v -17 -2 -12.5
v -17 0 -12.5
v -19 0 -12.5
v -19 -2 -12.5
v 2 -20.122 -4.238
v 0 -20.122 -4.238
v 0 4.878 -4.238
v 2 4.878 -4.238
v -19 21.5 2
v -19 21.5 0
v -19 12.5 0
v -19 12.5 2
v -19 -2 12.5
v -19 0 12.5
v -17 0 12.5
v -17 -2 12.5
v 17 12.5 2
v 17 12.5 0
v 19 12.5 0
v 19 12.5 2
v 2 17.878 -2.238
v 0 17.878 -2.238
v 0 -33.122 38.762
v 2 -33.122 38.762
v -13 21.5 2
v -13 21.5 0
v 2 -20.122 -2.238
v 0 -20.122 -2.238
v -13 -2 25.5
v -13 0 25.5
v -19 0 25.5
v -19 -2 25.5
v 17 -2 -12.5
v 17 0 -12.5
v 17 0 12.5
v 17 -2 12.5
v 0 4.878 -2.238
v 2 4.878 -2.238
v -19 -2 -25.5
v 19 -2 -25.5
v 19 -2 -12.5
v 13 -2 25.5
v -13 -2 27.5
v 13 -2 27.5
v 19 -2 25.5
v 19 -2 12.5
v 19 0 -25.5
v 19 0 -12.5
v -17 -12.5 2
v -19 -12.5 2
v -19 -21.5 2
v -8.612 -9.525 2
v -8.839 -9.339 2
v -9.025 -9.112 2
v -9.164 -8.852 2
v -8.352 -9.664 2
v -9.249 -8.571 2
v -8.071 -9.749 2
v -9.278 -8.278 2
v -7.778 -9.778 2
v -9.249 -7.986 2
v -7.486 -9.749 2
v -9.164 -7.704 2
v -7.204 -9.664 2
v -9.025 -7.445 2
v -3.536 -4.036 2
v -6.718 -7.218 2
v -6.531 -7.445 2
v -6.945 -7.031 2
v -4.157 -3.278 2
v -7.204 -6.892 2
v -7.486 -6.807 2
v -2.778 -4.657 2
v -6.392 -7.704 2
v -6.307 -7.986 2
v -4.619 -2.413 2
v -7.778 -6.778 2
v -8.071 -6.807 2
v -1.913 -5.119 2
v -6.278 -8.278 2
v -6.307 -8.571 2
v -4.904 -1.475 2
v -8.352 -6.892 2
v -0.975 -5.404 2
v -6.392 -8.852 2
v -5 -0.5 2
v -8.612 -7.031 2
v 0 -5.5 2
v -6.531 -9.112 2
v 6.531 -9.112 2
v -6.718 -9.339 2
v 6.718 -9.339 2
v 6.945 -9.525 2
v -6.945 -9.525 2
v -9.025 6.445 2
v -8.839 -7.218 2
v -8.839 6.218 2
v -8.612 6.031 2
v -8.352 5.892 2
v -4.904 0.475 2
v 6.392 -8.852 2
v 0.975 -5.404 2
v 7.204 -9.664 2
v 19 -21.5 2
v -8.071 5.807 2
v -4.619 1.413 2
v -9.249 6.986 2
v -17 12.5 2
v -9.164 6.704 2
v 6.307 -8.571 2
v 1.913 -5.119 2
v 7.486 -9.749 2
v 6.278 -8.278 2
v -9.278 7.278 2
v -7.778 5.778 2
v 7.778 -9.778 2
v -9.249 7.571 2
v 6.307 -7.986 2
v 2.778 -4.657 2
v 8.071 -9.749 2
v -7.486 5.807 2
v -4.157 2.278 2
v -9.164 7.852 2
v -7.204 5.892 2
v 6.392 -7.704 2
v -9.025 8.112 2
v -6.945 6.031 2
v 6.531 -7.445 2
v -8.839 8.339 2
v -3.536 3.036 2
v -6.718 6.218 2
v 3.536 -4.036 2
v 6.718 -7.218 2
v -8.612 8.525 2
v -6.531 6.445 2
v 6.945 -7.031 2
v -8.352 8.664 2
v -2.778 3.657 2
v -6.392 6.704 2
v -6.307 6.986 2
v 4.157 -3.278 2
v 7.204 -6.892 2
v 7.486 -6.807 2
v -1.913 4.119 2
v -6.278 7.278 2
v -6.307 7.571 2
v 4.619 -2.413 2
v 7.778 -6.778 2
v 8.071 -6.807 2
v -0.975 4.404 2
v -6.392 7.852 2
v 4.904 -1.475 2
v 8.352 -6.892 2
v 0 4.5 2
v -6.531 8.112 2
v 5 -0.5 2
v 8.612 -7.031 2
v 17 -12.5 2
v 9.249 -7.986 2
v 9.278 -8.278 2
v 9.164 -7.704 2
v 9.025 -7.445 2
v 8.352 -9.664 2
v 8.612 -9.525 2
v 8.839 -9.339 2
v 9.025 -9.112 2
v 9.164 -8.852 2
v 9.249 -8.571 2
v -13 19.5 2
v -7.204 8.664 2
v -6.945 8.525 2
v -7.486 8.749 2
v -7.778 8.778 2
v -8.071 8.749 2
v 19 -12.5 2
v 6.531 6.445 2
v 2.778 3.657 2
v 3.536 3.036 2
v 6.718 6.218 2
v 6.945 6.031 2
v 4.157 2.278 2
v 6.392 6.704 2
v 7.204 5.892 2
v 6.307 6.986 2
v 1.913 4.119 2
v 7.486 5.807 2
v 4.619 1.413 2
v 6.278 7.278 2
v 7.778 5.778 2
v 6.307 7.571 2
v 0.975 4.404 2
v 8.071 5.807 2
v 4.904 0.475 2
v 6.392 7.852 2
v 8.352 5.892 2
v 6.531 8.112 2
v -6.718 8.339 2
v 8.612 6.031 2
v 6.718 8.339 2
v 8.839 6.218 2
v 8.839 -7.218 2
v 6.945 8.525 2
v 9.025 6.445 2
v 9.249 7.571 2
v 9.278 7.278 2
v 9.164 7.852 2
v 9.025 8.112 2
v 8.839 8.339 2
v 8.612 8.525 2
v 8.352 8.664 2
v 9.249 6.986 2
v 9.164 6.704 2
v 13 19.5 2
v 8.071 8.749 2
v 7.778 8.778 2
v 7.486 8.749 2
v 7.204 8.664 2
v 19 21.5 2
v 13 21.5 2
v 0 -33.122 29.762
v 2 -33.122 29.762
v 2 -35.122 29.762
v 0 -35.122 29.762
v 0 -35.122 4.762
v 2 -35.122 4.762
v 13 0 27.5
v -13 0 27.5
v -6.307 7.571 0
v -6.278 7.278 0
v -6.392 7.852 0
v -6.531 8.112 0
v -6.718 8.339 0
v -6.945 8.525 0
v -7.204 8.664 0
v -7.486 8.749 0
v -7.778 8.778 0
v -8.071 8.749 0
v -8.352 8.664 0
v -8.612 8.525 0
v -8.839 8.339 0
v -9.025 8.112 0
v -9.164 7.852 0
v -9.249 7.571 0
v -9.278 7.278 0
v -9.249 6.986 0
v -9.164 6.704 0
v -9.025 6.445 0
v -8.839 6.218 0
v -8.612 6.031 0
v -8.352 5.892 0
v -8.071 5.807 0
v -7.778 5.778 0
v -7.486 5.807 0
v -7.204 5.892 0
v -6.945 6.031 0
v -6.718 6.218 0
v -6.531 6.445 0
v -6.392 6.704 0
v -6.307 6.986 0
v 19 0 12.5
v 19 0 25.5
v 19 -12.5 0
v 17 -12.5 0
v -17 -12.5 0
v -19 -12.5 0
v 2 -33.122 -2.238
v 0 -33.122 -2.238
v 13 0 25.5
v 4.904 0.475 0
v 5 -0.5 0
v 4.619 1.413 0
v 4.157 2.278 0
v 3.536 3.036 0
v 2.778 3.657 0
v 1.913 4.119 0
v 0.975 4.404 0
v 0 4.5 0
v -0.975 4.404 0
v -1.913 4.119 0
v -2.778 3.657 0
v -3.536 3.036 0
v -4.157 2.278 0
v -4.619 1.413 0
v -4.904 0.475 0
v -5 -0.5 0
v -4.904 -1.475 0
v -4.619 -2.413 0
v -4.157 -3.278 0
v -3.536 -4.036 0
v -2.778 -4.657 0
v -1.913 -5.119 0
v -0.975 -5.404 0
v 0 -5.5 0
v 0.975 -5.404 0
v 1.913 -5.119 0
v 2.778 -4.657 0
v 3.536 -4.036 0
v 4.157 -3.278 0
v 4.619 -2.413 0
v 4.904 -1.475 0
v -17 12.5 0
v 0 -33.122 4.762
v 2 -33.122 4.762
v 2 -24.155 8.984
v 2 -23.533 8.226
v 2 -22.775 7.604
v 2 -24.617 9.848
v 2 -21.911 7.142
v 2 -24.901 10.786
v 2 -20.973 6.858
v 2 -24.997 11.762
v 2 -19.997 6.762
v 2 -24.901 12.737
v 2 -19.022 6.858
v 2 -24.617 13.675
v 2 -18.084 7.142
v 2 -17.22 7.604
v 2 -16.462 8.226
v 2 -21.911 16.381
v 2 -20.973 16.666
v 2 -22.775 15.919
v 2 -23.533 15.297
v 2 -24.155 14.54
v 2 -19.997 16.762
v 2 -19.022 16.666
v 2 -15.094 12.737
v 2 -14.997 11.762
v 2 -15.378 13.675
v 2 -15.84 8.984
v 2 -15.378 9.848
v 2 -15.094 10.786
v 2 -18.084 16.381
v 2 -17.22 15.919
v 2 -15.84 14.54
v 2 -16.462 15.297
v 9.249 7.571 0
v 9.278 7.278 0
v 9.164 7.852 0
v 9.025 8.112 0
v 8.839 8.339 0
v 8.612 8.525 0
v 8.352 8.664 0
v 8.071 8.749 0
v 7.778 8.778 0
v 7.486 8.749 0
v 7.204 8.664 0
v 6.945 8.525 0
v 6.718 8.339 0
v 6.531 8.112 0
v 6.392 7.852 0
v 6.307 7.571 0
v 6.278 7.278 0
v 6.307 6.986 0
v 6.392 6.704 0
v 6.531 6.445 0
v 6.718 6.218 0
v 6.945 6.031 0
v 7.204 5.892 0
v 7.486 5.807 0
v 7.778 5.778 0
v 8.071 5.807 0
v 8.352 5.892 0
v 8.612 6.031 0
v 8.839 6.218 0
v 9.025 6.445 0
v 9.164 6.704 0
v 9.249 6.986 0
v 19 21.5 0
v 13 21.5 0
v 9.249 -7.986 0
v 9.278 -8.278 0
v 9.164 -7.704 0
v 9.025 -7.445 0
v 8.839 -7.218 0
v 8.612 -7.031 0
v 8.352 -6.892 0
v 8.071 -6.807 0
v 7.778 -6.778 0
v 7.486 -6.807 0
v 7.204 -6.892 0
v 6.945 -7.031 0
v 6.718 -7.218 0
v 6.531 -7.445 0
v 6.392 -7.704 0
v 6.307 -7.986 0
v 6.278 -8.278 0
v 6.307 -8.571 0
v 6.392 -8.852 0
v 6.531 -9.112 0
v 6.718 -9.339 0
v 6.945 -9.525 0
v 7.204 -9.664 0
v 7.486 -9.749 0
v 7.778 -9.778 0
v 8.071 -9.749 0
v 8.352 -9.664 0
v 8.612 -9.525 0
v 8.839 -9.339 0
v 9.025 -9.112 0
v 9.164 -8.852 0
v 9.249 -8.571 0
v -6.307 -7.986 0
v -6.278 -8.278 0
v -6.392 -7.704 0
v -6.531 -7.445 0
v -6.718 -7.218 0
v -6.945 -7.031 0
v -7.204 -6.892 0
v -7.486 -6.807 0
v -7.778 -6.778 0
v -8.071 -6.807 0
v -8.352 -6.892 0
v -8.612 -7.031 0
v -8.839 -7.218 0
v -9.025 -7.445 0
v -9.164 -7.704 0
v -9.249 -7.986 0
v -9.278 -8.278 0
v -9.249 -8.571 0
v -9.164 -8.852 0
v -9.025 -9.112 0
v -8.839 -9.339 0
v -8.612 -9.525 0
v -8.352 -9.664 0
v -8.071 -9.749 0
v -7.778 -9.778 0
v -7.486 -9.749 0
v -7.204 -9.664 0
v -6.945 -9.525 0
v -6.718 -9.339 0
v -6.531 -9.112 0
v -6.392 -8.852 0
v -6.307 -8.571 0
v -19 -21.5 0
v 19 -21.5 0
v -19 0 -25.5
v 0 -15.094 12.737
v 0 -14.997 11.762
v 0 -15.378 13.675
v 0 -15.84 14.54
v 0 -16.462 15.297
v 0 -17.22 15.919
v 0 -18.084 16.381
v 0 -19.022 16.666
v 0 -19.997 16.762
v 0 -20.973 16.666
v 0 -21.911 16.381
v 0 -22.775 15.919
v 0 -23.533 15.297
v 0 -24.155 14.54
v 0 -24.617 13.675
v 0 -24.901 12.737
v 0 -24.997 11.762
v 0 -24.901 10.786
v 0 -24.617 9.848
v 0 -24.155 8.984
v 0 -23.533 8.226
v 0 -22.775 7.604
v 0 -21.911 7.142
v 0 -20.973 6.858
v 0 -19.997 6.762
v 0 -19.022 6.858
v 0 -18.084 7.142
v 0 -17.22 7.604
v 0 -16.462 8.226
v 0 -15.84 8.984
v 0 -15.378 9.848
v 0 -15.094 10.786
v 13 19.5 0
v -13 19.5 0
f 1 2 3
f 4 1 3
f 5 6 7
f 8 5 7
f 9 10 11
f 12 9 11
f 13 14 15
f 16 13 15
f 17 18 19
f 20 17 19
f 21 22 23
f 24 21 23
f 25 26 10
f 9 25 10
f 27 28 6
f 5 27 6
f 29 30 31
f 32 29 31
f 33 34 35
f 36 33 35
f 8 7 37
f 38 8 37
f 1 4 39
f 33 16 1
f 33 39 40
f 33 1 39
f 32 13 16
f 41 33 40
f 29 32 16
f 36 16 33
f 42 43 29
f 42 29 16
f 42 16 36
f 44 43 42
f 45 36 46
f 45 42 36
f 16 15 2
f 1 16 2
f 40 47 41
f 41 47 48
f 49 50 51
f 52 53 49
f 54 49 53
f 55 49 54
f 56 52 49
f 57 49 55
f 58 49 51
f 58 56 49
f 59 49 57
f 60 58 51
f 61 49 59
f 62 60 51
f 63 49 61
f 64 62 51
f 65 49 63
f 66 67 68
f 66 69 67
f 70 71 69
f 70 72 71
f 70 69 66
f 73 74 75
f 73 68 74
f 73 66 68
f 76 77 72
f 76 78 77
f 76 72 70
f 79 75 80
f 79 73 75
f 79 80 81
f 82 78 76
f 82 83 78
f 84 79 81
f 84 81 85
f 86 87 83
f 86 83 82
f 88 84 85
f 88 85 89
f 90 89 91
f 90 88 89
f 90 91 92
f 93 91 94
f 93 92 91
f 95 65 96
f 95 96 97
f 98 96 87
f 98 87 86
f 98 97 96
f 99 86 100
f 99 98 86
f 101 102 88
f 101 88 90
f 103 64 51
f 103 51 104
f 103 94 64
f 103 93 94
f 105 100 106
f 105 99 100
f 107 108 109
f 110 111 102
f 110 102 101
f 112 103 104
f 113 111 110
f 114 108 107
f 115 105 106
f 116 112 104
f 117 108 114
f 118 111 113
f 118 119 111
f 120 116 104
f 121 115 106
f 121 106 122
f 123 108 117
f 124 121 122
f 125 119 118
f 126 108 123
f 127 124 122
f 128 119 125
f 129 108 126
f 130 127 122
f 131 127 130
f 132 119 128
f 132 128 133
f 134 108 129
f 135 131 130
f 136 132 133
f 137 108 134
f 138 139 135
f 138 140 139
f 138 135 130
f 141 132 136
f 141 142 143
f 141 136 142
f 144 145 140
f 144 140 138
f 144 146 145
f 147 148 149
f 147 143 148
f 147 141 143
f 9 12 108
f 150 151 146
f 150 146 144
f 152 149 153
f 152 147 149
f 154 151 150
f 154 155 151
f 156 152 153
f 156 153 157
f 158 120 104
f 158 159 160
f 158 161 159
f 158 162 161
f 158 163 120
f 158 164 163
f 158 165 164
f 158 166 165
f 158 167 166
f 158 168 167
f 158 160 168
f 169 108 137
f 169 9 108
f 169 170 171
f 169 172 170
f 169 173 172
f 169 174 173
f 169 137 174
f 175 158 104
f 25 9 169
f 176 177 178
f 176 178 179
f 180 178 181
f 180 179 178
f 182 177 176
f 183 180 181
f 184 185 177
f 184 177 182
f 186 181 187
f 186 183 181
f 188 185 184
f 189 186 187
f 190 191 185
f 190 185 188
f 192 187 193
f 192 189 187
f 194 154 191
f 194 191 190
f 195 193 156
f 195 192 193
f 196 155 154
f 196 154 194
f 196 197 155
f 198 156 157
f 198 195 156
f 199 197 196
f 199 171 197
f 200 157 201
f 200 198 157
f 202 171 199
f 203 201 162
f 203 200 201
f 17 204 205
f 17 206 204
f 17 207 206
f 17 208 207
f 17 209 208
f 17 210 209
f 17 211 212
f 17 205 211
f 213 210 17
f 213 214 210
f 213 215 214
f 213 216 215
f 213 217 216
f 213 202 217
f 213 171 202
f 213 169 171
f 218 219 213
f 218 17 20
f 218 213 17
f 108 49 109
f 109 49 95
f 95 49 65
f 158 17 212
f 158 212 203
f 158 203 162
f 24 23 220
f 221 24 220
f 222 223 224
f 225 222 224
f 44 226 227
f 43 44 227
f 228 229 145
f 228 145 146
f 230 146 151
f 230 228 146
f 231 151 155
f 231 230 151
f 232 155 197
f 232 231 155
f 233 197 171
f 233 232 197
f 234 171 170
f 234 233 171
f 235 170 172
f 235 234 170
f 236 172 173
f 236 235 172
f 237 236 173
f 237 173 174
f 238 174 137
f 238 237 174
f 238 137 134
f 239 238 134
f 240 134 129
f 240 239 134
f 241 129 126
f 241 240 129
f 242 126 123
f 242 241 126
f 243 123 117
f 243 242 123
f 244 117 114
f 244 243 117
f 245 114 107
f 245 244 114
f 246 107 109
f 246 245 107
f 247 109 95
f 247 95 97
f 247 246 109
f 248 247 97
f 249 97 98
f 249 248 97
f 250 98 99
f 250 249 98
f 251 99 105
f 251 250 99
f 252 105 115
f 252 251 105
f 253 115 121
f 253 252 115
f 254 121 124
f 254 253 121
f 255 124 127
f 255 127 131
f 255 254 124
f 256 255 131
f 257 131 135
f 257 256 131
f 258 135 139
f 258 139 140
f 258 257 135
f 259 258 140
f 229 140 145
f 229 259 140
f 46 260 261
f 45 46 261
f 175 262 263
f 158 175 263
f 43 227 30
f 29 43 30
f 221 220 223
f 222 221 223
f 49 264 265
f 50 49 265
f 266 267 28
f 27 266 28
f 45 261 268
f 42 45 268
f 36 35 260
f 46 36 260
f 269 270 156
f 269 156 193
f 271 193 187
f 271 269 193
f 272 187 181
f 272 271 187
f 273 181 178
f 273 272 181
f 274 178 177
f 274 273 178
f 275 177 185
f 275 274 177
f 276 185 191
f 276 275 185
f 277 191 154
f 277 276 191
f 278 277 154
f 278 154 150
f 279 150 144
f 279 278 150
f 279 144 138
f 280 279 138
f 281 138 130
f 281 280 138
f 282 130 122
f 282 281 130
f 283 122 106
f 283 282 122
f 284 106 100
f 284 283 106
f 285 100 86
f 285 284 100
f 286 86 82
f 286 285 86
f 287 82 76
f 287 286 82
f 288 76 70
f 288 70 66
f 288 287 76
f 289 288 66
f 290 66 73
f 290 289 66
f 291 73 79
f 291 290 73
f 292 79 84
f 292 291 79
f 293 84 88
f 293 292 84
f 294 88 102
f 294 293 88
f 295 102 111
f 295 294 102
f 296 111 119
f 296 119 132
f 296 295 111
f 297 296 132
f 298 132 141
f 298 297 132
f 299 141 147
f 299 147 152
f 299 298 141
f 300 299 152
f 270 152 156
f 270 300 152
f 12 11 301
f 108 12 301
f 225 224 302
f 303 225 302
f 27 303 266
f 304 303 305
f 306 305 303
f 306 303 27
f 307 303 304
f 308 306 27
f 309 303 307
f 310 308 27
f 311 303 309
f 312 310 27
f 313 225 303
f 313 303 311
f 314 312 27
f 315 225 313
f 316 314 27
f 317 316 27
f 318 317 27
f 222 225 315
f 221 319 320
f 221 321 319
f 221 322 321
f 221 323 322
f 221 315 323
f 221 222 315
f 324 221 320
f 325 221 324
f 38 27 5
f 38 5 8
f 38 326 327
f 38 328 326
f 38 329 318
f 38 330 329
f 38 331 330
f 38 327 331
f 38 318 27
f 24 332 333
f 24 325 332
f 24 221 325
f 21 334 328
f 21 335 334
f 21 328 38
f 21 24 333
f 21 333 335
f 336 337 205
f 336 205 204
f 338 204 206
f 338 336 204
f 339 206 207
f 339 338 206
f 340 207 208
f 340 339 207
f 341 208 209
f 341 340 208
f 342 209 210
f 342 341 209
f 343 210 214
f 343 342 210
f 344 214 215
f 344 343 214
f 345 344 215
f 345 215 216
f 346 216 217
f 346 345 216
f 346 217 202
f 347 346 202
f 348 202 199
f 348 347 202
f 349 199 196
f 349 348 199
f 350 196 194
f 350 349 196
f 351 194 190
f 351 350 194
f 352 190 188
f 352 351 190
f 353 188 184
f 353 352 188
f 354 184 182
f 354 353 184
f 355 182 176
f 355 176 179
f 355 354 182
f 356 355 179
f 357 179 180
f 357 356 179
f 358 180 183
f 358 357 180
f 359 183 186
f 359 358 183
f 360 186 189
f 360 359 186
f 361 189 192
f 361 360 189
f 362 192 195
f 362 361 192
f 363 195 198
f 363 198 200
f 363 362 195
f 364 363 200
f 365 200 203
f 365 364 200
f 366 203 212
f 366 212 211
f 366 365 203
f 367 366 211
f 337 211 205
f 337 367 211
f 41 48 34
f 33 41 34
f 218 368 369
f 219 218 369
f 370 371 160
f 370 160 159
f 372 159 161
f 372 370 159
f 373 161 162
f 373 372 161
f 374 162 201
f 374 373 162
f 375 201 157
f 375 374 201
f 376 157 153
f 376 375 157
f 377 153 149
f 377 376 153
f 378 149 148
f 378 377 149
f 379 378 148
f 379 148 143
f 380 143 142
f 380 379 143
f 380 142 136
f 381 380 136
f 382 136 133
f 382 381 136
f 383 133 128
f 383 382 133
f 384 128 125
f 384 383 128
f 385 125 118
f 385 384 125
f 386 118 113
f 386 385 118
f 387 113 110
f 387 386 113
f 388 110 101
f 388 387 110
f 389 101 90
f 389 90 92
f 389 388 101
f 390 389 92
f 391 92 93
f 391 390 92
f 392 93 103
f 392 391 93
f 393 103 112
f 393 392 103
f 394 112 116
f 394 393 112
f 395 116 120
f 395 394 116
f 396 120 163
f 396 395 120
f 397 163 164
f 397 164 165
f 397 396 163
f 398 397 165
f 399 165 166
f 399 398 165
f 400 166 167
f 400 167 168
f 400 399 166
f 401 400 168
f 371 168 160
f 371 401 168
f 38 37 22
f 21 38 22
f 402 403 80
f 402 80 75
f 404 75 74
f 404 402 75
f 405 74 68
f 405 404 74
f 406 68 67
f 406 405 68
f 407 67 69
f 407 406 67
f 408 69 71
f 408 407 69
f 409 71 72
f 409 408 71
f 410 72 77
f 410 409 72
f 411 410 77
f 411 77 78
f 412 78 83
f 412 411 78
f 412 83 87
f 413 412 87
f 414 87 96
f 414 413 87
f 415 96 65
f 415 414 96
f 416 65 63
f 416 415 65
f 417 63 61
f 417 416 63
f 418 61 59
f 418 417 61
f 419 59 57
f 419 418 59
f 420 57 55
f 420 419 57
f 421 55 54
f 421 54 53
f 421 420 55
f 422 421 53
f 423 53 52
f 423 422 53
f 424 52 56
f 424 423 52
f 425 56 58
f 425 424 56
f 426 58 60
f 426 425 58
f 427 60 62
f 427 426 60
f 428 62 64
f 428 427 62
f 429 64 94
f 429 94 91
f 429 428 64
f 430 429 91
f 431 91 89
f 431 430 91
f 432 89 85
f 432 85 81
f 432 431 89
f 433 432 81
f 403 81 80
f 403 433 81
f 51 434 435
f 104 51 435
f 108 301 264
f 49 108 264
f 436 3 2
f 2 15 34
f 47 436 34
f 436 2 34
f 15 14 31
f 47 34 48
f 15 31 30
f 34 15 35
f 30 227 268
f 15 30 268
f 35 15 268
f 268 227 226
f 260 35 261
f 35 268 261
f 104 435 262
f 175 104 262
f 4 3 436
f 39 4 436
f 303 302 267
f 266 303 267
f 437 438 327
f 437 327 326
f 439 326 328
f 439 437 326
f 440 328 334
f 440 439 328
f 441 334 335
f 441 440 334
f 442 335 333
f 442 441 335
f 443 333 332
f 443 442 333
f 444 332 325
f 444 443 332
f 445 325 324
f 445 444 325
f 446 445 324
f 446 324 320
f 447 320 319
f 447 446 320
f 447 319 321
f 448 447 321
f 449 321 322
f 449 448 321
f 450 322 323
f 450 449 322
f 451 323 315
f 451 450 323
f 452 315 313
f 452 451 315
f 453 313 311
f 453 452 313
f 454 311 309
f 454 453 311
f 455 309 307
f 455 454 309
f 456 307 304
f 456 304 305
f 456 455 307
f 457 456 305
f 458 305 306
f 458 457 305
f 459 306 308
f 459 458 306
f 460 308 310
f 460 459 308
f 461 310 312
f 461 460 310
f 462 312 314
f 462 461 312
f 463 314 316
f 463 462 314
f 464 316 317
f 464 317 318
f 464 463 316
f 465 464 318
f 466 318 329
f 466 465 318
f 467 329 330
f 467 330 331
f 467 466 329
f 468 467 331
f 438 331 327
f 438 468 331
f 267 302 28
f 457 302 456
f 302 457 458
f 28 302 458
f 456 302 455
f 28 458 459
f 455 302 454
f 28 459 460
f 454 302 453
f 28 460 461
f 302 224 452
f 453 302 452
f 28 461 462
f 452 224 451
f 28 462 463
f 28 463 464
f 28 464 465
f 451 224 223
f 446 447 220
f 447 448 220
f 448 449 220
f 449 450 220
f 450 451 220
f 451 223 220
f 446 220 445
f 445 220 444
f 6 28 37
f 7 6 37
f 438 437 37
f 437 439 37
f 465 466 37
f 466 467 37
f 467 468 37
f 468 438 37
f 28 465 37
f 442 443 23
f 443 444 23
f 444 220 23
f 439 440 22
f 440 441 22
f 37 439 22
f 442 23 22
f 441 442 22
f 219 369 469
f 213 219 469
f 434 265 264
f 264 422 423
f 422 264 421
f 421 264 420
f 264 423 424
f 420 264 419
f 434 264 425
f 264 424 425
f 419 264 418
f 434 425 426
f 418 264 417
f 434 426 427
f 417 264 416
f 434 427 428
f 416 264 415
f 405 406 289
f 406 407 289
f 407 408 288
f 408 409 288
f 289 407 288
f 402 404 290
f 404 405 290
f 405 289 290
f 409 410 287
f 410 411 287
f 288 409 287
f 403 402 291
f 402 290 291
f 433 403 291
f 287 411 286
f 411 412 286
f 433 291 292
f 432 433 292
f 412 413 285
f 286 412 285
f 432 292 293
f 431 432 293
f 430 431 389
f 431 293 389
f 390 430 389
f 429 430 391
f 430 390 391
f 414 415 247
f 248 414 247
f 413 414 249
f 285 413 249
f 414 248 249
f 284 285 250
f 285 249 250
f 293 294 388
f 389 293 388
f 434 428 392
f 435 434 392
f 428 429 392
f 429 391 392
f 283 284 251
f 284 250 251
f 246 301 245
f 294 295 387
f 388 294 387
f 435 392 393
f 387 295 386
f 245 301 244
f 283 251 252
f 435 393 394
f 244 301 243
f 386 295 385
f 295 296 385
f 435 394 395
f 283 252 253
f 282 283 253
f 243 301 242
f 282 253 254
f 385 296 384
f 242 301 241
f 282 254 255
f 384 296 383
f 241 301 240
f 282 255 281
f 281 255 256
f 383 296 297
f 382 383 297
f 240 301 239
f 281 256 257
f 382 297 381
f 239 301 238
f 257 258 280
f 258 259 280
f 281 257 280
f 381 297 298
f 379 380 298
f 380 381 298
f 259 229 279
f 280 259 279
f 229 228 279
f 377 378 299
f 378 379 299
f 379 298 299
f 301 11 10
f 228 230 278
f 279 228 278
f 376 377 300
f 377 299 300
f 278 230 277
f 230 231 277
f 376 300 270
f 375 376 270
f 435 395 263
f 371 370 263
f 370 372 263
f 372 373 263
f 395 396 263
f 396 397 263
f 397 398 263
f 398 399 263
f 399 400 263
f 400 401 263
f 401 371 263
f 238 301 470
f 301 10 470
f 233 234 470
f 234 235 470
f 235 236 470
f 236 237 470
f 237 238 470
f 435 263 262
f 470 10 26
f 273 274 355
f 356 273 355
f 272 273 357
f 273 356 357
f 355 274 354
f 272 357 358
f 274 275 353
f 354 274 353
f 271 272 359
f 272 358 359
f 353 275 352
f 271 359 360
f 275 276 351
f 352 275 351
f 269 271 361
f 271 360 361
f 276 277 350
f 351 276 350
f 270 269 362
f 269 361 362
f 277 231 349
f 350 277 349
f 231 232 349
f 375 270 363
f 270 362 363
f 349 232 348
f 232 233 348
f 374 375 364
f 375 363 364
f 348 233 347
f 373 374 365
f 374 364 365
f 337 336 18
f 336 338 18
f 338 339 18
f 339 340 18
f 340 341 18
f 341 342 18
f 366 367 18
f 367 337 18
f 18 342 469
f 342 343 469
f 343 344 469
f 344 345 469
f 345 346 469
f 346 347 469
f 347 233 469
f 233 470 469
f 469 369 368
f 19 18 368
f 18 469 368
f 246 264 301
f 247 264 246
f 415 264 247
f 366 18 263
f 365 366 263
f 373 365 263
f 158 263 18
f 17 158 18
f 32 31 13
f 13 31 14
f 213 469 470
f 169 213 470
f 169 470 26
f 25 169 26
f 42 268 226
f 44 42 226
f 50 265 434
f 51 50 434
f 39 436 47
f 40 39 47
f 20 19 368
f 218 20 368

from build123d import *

# Parameters (mm, degrees)
F1_DEPTH = 2
F6_R     = 1.5
F6_R_2   = 5
F7_DEPTH = 2
F8_R     = 5
F9_DEPTH = 2


with BuildPart() as f1:
    # F0 (on Front) → F1 (new body)
    with BuildSketch(Plane.XZ):
        Polygon((19, 12.5), (19, 25.5), (13, 25.5), (13, 27.5), (-13, 27.5), (-13, 25.5), (-19, 25.5), (-19, 12.5), (-17, 12.5), (-17, -12.5), (-19, -12.5), (-19, -25.5), (19, -25.5), (19, -12.5), (17, -12.5), (17, 12.5), align=None)
    extrude(amount=F1_DEPTH)


with BuildPart() as f2_1:
    # F2: copy of F1
    add(f1.part)


with BuildPart() as f4_1:
    # F4: copy of F1
    add(f1.part)


with BuildPart() as f7:
    # F6 (on Top) → F7 (new body)
    with BuildSketch(Plane.XY):
        Polygon((19, 12.5), (19, 21.5), (13, 21.5), (13, 19.5), (-13, 19.5), (-13, 21.5), (-19, 21.5), (-19, 12.5), (-17, 12.5), (-17, -12.5), (-19, -12.5), (-19, -21.5), (19, -21.5), (19, -12.5), (17, -12.5), (17, 12.5), align=None)
        with Locations((-7.778175, -8.278175)):
            Circle(F6_R, mode=Mode.SUBTRACT)
        with Locations((7.778175, -8.278175)):
            Circle(F6_R, mode=Mode.SUBTRACT)
        with Locations((0, -0.5)):
            Circle(F6_R_2, mode=Mode.SUBTRACT)
        with Locations((-7.778175, 7.278175)):
            Circle(F6_R, mode=Mode.SUBTRACT)
        with Locations((7.778175, 7.278175)):
            Circle(F6_R, mode=Mode.SUBTRACT)
    extrude(amount=F7_DEPTH)


with BuildPart() as f9:
    # F8 (on Right) → F9 (new body)
    with BuildSketch(Plane.YZ):
        Polygon((17.878243, -2.23831), (-33.121757, 38.76169), (-33.121757, 29.76169), (-35.121757, 29.76169), (-35.121757, 4.76169), (-33.121757, 4.76169), (-33.121757, -2.23831), (-20.121757, -2.23831), (-20.121757, -4.23831), (4.878243, -4.23831), (4.878243, -2.23831), align=None)
        with Locations((-19.997433, 11.76169)):
            Circle(F8_R, mode=Mode.SUBTRACT)
    extrude(amount=F9_DEPTH)


solid = Compound([f1.part, f7.part, f9.part])
